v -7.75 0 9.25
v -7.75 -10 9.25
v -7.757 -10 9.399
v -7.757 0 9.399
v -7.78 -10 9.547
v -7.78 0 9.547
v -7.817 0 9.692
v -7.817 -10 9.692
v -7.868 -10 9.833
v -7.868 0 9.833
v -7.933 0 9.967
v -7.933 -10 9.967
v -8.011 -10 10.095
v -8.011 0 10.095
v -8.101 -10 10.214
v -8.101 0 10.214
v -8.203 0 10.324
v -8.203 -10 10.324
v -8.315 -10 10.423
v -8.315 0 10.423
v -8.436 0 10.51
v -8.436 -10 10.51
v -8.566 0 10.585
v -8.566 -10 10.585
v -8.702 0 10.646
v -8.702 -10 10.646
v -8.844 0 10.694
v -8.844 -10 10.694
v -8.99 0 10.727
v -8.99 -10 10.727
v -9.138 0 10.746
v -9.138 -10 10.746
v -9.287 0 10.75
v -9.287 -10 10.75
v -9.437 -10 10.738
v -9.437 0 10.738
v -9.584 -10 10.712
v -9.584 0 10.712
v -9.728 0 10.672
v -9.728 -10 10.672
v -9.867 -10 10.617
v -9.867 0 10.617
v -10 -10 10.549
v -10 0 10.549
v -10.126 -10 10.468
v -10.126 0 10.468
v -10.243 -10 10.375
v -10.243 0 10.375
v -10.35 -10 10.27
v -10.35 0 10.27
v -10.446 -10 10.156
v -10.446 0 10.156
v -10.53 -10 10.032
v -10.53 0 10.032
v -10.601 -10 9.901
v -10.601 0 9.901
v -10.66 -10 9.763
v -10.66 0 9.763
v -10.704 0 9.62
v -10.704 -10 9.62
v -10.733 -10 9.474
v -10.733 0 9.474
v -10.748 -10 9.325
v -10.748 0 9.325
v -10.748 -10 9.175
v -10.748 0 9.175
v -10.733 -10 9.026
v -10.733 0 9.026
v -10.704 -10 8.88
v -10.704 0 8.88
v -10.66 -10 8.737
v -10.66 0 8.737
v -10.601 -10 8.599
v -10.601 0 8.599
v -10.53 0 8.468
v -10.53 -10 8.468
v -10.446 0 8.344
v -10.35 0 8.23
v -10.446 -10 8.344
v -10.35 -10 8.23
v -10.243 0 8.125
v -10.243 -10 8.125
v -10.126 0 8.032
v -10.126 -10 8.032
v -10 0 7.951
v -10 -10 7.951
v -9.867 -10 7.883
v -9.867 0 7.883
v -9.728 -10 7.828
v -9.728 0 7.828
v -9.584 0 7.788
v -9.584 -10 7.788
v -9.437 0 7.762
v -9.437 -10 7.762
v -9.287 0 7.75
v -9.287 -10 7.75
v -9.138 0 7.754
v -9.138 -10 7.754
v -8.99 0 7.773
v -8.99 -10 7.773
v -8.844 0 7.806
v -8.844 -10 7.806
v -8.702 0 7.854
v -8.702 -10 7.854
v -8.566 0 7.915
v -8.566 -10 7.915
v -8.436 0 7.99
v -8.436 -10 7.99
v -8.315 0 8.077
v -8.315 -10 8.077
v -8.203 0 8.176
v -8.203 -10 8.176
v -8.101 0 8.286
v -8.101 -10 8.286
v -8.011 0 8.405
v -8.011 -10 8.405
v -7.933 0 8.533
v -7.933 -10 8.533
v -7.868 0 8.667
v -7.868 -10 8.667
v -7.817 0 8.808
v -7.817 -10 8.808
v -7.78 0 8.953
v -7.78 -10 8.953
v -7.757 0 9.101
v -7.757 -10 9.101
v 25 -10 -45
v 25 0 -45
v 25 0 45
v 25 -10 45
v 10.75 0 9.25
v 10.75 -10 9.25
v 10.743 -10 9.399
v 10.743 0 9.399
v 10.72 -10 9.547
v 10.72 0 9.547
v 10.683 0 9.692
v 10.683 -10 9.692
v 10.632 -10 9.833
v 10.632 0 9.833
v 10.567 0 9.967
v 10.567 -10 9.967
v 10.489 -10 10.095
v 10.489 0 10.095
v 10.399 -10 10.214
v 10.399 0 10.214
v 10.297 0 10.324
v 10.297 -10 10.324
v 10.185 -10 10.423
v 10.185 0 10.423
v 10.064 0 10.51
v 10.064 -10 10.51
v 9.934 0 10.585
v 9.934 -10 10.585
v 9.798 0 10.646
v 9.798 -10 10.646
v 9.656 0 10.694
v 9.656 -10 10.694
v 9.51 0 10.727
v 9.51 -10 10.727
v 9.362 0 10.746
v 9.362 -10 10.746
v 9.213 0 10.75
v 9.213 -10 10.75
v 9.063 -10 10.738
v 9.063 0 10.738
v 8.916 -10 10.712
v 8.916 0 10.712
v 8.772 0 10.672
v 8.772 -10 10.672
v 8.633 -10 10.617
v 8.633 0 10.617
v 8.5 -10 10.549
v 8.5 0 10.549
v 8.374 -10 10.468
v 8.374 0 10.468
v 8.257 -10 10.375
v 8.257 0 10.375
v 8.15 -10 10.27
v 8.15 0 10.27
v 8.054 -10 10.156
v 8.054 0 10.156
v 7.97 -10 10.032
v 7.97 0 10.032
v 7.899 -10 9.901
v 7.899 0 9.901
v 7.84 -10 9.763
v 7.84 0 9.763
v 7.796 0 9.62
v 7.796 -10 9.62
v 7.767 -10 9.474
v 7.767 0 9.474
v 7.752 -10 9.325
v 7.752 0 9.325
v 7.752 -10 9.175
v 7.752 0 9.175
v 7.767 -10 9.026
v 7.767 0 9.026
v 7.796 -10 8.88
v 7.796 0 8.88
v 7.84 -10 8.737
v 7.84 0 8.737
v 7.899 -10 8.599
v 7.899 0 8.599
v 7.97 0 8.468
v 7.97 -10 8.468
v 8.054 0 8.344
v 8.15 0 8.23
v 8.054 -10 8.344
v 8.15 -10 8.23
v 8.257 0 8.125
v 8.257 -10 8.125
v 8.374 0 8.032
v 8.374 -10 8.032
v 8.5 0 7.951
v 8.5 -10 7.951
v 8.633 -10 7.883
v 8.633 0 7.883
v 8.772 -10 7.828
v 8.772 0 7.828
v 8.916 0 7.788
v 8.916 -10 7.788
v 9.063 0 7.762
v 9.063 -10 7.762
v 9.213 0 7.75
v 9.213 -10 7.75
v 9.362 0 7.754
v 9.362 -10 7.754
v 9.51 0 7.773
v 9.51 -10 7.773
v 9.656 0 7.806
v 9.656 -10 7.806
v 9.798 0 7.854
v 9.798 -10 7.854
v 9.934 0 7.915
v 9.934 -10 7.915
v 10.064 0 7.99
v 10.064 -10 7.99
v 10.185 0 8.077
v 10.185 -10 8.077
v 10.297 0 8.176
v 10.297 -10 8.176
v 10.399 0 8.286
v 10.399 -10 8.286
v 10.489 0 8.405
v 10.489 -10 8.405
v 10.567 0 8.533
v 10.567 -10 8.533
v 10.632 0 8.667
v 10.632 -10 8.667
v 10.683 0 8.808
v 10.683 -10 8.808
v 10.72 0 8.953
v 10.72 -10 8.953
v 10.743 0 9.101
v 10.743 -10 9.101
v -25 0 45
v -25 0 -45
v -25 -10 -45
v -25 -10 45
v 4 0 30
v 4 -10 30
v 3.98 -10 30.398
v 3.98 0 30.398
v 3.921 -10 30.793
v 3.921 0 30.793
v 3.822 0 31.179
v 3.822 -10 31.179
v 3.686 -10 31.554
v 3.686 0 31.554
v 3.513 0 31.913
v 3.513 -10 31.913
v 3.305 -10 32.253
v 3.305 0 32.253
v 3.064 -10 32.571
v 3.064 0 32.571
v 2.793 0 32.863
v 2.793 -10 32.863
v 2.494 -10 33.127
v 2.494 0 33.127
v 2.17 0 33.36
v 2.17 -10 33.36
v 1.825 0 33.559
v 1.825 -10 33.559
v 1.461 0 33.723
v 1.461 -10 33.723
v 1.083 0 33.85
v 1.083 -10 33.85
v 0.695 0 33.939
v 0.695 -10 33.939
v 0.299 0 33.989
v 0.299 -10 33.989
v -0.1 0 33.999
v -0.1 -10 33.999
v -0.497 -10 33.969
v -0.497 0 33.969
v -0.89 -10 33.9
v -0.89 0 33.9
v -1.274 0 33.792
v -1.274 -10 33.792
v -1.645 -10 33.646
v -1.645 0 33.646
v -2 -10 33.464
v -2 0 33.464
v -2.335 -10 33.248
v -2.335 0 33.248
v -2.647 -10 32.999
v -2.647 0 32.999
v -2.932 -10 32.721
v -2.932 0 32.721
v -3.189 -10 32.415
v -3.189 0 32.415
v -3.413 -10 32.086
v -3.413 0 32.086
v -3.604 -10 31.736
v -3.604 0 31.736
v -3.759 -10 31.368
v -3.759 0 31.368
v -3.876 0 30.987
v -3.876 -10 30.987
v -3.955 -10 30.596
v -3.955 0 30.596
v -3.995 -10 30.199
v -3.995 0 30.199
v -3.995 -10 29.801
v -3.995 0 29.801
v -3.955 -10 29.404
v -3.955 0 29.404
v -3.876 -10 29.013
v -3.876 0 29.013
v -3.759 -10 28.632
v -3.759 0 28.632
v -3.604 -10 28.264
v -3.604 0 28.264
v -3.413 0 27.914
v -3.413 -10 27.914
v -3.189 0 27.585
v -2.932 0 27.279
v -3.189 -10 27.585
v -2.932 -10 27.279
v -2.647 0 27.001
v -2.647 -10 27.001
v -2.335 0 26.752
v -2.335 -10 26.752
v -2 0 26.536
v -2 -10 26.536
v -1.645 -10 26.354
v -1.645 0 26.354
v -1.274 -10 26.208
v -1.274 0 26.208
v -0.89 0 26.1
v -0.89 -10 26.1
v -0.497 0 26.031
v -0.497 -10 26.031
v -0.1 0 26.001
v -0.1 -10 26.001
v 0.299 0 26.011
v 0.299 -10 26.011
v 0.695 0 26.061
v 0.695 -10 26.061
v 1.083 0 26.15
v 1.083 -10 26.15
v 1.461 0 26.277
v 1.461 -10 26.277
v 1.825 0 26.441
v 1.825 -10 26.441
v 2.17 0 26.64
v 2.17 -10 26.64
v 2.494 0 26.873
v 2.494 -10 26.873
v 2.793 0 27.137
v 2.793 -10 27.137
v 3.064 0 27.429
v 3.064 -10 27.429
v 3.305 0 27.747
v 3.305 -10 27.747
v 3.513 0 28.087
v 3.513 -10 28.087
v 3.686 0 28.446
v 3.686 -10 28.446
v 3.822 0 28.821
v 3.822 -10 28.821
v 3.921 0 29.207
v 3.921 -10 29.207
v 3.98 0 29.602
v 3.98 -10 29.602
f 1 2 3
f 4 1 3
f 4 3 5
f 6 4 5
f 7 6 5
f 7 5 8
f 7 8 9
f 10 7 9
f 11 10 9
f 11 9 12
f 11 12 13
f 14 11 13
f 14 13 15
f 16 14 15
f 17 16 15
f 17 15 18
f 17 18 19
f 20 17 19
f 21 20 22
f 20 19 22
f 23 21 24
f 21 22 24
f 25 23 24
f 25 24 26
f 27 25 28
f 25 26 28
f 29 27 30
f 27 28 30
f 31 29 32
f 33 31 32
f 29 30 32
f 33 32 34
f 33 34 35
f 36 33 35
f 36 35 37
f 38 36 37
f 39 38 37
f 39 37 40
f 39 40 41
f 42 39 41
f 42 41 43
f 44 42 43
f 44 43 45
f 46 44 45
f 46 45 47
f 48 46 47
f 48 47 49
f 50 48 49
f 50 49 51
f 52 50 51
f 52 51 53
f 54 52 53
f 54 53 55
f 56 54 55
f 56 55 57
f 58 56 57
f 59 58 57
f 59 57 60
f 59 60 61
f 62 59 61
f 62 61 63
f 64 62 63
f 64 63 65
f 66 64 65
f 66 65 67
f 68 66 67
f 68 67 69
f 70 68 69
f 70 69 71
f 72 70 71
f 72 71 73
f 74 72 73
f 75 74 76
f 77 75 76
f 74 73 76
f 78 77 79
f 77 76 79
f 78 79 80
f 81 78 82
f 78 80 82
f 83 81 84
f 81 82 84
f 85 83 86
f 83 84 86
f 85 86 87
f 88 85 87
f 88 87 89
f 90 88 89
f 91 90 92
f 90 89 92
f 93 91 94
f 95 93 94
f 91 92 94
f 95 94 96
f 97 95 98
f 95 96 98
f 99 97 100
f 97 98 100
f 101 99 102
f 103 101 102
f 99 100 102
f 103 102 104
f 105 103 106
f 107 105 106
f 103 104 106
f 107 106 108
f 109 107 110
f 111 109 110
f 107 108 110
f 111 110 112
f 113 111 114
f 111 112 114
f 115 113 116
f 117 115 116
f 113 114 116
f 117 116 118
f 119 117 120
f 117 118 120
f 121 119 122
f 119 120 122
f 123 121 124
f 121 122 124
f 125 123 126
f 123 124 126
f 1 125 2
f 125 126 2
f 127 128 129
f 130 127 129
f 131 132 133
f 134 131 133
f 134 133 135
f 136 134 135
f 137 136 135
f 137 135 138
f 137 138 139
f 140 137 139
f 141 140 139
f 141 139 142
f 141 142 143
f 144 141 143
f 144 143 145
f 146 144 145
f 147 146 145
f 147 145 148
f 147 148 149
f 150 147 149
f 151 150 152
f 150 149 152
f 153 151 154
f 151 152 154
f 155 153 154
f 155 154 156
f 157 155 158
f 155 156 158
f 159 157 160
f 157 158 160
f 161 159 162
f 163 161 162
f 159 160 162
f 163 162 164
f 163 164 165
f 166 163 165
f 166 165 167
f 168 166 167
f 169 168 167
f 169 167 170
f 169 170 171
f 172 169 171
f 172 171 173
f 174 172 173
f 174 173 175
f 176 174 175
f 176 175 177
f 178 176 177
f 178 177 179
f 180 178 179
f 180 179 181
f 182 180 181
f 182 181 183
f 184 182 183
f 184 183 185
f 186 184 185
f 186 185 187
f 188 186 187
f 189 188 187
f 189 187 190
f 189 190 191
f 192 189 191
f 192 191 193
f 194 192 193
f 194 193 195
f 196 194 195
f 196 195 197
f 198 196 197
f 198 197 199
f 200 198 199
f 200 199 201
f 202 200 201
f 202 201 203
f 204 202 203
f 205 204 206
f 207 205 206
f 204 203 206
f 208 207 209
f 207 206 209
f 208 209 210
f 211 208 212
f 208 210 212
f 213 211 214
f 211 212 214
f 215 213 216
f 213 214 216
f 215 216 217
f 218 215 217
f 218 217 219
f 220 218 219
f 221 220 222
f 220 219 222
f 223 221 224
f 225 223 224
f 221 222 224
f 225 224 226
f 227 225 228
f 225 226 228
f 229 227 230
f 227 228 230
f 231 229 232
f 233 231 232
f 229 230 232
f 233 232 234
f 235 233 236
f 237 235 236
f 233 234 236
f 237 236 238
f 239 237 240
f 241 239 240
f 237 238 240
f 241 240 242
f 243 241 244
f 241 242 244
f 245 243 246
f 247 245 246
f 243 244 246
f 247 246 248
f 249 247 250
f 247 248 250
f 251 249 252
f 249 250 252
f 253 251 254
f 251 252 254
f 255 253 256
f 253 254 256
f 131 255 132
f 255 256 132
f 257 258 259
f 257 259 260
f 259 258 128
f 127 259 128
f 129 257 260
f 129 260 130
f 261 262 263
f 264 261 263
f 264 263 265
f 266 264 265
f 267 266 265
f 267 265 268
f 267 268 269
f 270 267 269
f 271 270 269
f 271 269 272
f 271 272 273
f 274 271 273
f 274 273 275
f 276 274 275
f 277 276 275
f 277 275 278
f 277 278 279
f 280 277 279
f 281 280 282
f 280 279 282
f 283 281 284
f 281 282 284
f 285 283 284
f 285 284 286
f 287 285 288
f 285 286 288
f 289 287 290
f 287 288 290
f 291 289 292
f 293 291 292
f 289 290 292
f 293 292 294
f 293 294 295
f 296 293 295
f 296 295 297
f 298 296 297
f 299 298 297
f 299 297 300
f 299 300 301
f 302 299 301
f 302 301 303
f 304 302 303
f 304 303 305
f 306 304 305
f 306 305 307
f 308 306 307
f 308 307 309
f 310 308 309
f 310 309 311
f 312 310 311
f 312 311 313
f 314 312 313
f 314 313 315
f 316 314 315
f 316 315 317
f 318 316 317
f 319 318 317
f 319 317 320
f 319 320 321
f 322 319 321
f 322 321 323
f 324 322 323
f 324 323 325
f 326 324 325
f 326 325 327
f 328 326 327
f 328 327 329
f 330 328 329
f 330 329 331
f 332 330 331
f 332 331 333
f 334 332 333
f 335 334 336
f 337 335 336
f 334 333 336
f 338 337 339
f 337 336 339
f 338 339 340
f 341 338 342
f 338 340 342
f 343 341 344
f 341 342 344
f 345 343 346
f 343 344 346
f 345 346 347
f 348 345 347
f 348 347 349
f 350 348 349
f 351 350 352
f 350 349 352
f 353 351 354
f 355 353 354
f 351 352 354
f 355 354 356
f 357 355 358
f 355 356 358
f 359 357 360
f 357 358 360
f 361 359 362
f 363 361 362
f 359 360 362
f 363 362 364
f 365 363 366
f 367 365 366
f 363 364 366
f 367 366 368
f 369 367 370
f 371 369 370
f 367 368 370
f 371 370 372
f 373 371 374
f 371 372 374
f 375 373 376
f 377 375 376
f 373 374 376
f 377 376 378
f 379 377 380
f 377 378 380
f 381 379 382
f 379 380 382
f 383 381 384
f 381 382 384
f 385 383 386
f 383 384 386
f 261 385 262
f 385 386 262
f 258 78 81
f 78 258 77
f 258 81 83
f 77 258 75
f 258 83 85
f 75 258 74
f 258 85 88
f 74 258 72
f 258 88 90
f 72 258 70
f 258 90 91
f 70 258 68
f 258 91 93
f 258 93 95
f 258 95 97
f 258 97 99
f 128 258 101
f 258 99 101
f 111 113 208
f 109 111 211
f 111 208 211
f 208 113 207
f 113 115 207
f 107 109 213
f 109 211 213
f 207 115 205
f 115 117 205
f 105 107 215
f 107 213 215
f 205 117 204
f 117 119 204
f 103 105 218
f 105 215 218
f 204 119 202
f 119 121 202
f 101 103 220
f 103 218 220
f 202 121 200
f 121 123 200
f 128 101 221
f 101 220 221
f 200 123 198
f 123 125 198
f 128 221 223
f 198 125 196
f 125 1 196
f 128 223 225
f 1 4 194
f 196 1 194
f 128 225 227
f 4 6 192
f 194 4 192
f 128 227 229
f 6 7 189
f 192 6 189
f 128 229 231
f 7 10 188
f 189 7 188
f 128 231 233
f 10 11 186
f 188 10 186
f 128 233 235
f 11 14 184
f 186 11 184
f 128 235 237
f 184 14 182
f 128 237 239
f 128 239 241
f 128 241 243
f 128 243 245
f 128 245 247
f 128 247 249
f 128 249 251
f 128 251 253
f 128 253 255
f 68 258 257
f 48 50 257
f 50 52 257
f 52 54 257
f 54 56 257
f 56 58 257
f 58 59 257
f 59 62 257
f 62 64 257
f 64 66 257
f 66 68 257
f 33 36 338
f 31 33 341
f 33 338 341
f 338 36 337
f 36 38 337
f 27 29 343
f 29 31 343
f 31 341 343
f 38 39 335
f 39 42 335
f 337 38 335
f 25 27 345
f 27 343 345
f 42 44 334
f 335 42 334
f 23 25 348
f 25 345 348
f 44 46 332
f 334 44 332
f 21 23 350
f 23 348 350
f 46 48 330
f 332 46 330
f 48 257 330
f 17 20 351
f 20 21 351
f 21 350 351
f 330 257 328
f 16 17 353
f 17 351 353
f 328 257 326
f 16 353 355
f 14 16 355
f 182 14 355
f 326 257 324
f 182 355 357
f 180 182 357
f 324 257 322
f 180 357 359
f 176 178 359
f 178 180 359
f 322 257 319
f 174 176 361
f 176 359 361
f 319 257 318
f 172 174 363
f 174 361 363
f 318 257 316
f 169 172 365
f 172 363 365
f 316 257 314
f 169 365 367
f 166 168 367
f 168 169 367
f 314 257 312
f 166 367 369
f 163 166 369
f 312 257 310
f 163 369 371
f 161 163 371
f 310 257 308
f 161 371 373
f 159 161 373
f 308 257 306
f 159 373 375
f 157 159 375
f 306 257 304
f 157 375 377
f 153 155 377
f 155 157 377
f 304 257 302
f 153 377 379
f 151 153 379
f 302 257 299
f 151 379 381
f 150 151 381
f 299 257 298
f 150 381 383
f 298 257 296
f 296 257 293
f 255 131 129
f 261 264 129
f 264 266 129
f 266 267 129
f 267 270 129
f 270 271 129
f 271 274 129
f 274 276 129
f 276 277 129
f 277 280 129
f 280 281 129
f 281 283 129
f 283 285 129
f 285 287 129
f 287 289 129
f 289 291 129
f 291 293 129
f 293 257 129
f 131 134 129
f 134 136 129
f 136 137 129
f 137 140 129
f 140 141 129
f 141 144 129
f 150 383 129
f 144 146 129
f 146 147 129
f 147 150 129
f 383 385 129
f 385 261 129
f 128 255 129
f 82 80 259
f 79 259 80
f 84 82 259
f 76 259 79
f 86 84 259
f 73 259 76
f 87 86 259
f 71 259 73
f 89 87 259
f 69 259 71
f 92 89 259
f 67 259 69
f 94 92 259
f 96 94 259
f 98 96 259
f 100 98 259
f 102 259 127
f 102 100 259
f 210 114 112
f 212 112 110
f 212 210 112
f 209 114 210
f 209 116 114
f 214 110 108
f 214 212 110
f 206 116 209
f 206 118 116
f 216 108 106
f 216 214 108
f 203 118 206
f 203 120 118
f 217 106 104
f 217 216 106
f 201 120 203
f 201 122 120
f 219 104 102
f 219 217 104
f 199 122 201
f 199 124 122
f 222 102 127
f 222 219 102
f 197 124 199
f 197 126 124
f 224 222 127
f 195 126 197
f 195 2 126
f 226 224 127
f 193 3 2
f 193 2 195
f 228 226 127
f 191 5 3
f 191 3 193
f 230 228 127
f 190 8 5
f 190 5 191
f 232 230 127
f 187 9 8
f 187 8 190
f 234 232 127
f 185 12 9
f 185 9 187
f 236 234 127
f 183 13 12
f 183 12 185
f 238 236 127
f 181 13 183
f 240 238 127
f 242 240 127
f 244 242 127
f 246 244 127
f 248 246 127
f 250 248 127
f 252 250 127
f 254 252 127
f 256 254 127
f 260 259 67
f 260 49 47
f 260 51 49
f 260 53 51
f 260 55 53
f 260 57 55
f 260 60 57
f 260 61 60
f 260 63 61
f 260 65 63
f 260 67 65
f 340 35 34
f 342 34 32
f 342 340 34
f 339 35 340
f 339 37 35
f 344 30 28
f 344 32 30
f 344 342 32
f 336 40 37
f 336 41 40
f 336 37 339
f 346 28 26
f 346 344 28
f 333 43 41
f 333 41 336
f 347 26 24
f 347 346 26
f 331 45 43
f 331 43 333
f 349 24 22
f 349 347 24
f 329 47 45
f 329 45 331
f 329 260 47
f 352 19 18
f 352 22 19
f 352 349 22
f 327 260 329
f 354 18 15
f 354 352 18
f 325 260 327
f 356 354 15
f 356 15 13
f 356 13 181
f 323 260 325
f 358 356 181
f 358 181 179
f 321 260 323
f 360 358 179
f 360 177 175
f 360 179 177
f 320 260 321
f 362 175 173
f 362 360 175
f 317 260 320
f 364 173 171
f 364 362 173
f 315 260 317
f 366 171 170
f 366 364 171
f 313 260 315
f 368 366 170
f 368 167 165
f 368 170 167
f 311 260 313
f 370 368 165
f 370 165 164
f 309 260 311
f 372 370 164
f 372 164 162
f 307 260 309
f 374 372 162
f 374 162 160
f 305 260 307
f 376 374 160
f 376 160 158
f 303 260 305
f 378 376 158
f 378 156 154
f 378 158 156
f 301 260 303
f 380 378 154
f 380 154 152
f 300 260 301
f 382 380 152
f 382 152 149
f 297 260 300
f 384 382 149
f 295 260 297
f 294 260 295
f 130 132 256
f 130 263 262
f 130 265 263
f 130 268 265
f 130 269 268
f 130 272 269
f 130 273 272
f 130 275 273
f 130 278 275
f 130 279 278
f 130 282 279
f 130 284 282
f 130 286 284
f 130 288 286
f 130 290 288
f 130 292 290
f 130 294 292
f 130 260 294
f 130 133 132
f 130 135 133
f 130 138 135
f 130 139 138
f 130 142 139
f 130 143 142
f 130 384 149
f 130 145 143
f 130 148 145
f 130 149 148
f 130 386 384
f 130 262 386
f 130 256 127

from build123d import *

# Parameters (mm, degrees)
F0_W     = 50
F0_H     = 90
F1_DEPTH = 10
F2_R     = 4
F2_R_2   = 1.5
F3_DEPTH = 25


with BuildPart() as f1:
    # F0 (on Front) → F1 (new body)
    with BuildSketch(Plane.XZ):
        Rectangle(F0_W, F0_H)
    extrude(amount=F1_DEPTH)

    # F2 (on face) → F3 (cut)
    with BuildSketch(Plane.XZ.offset(10)):
        with Locations((0, 30)):
            Circle(F2_R)
        with Locations((9.25, 9.25)):
            Circle(F2_R_2)
        with Locations((-9.25, 9.25)):
            Circle(F2_R_2)
    extrude(amount=-F3_DEPTH, mode=Mode.SUBTRACT)


solid = f1.part
